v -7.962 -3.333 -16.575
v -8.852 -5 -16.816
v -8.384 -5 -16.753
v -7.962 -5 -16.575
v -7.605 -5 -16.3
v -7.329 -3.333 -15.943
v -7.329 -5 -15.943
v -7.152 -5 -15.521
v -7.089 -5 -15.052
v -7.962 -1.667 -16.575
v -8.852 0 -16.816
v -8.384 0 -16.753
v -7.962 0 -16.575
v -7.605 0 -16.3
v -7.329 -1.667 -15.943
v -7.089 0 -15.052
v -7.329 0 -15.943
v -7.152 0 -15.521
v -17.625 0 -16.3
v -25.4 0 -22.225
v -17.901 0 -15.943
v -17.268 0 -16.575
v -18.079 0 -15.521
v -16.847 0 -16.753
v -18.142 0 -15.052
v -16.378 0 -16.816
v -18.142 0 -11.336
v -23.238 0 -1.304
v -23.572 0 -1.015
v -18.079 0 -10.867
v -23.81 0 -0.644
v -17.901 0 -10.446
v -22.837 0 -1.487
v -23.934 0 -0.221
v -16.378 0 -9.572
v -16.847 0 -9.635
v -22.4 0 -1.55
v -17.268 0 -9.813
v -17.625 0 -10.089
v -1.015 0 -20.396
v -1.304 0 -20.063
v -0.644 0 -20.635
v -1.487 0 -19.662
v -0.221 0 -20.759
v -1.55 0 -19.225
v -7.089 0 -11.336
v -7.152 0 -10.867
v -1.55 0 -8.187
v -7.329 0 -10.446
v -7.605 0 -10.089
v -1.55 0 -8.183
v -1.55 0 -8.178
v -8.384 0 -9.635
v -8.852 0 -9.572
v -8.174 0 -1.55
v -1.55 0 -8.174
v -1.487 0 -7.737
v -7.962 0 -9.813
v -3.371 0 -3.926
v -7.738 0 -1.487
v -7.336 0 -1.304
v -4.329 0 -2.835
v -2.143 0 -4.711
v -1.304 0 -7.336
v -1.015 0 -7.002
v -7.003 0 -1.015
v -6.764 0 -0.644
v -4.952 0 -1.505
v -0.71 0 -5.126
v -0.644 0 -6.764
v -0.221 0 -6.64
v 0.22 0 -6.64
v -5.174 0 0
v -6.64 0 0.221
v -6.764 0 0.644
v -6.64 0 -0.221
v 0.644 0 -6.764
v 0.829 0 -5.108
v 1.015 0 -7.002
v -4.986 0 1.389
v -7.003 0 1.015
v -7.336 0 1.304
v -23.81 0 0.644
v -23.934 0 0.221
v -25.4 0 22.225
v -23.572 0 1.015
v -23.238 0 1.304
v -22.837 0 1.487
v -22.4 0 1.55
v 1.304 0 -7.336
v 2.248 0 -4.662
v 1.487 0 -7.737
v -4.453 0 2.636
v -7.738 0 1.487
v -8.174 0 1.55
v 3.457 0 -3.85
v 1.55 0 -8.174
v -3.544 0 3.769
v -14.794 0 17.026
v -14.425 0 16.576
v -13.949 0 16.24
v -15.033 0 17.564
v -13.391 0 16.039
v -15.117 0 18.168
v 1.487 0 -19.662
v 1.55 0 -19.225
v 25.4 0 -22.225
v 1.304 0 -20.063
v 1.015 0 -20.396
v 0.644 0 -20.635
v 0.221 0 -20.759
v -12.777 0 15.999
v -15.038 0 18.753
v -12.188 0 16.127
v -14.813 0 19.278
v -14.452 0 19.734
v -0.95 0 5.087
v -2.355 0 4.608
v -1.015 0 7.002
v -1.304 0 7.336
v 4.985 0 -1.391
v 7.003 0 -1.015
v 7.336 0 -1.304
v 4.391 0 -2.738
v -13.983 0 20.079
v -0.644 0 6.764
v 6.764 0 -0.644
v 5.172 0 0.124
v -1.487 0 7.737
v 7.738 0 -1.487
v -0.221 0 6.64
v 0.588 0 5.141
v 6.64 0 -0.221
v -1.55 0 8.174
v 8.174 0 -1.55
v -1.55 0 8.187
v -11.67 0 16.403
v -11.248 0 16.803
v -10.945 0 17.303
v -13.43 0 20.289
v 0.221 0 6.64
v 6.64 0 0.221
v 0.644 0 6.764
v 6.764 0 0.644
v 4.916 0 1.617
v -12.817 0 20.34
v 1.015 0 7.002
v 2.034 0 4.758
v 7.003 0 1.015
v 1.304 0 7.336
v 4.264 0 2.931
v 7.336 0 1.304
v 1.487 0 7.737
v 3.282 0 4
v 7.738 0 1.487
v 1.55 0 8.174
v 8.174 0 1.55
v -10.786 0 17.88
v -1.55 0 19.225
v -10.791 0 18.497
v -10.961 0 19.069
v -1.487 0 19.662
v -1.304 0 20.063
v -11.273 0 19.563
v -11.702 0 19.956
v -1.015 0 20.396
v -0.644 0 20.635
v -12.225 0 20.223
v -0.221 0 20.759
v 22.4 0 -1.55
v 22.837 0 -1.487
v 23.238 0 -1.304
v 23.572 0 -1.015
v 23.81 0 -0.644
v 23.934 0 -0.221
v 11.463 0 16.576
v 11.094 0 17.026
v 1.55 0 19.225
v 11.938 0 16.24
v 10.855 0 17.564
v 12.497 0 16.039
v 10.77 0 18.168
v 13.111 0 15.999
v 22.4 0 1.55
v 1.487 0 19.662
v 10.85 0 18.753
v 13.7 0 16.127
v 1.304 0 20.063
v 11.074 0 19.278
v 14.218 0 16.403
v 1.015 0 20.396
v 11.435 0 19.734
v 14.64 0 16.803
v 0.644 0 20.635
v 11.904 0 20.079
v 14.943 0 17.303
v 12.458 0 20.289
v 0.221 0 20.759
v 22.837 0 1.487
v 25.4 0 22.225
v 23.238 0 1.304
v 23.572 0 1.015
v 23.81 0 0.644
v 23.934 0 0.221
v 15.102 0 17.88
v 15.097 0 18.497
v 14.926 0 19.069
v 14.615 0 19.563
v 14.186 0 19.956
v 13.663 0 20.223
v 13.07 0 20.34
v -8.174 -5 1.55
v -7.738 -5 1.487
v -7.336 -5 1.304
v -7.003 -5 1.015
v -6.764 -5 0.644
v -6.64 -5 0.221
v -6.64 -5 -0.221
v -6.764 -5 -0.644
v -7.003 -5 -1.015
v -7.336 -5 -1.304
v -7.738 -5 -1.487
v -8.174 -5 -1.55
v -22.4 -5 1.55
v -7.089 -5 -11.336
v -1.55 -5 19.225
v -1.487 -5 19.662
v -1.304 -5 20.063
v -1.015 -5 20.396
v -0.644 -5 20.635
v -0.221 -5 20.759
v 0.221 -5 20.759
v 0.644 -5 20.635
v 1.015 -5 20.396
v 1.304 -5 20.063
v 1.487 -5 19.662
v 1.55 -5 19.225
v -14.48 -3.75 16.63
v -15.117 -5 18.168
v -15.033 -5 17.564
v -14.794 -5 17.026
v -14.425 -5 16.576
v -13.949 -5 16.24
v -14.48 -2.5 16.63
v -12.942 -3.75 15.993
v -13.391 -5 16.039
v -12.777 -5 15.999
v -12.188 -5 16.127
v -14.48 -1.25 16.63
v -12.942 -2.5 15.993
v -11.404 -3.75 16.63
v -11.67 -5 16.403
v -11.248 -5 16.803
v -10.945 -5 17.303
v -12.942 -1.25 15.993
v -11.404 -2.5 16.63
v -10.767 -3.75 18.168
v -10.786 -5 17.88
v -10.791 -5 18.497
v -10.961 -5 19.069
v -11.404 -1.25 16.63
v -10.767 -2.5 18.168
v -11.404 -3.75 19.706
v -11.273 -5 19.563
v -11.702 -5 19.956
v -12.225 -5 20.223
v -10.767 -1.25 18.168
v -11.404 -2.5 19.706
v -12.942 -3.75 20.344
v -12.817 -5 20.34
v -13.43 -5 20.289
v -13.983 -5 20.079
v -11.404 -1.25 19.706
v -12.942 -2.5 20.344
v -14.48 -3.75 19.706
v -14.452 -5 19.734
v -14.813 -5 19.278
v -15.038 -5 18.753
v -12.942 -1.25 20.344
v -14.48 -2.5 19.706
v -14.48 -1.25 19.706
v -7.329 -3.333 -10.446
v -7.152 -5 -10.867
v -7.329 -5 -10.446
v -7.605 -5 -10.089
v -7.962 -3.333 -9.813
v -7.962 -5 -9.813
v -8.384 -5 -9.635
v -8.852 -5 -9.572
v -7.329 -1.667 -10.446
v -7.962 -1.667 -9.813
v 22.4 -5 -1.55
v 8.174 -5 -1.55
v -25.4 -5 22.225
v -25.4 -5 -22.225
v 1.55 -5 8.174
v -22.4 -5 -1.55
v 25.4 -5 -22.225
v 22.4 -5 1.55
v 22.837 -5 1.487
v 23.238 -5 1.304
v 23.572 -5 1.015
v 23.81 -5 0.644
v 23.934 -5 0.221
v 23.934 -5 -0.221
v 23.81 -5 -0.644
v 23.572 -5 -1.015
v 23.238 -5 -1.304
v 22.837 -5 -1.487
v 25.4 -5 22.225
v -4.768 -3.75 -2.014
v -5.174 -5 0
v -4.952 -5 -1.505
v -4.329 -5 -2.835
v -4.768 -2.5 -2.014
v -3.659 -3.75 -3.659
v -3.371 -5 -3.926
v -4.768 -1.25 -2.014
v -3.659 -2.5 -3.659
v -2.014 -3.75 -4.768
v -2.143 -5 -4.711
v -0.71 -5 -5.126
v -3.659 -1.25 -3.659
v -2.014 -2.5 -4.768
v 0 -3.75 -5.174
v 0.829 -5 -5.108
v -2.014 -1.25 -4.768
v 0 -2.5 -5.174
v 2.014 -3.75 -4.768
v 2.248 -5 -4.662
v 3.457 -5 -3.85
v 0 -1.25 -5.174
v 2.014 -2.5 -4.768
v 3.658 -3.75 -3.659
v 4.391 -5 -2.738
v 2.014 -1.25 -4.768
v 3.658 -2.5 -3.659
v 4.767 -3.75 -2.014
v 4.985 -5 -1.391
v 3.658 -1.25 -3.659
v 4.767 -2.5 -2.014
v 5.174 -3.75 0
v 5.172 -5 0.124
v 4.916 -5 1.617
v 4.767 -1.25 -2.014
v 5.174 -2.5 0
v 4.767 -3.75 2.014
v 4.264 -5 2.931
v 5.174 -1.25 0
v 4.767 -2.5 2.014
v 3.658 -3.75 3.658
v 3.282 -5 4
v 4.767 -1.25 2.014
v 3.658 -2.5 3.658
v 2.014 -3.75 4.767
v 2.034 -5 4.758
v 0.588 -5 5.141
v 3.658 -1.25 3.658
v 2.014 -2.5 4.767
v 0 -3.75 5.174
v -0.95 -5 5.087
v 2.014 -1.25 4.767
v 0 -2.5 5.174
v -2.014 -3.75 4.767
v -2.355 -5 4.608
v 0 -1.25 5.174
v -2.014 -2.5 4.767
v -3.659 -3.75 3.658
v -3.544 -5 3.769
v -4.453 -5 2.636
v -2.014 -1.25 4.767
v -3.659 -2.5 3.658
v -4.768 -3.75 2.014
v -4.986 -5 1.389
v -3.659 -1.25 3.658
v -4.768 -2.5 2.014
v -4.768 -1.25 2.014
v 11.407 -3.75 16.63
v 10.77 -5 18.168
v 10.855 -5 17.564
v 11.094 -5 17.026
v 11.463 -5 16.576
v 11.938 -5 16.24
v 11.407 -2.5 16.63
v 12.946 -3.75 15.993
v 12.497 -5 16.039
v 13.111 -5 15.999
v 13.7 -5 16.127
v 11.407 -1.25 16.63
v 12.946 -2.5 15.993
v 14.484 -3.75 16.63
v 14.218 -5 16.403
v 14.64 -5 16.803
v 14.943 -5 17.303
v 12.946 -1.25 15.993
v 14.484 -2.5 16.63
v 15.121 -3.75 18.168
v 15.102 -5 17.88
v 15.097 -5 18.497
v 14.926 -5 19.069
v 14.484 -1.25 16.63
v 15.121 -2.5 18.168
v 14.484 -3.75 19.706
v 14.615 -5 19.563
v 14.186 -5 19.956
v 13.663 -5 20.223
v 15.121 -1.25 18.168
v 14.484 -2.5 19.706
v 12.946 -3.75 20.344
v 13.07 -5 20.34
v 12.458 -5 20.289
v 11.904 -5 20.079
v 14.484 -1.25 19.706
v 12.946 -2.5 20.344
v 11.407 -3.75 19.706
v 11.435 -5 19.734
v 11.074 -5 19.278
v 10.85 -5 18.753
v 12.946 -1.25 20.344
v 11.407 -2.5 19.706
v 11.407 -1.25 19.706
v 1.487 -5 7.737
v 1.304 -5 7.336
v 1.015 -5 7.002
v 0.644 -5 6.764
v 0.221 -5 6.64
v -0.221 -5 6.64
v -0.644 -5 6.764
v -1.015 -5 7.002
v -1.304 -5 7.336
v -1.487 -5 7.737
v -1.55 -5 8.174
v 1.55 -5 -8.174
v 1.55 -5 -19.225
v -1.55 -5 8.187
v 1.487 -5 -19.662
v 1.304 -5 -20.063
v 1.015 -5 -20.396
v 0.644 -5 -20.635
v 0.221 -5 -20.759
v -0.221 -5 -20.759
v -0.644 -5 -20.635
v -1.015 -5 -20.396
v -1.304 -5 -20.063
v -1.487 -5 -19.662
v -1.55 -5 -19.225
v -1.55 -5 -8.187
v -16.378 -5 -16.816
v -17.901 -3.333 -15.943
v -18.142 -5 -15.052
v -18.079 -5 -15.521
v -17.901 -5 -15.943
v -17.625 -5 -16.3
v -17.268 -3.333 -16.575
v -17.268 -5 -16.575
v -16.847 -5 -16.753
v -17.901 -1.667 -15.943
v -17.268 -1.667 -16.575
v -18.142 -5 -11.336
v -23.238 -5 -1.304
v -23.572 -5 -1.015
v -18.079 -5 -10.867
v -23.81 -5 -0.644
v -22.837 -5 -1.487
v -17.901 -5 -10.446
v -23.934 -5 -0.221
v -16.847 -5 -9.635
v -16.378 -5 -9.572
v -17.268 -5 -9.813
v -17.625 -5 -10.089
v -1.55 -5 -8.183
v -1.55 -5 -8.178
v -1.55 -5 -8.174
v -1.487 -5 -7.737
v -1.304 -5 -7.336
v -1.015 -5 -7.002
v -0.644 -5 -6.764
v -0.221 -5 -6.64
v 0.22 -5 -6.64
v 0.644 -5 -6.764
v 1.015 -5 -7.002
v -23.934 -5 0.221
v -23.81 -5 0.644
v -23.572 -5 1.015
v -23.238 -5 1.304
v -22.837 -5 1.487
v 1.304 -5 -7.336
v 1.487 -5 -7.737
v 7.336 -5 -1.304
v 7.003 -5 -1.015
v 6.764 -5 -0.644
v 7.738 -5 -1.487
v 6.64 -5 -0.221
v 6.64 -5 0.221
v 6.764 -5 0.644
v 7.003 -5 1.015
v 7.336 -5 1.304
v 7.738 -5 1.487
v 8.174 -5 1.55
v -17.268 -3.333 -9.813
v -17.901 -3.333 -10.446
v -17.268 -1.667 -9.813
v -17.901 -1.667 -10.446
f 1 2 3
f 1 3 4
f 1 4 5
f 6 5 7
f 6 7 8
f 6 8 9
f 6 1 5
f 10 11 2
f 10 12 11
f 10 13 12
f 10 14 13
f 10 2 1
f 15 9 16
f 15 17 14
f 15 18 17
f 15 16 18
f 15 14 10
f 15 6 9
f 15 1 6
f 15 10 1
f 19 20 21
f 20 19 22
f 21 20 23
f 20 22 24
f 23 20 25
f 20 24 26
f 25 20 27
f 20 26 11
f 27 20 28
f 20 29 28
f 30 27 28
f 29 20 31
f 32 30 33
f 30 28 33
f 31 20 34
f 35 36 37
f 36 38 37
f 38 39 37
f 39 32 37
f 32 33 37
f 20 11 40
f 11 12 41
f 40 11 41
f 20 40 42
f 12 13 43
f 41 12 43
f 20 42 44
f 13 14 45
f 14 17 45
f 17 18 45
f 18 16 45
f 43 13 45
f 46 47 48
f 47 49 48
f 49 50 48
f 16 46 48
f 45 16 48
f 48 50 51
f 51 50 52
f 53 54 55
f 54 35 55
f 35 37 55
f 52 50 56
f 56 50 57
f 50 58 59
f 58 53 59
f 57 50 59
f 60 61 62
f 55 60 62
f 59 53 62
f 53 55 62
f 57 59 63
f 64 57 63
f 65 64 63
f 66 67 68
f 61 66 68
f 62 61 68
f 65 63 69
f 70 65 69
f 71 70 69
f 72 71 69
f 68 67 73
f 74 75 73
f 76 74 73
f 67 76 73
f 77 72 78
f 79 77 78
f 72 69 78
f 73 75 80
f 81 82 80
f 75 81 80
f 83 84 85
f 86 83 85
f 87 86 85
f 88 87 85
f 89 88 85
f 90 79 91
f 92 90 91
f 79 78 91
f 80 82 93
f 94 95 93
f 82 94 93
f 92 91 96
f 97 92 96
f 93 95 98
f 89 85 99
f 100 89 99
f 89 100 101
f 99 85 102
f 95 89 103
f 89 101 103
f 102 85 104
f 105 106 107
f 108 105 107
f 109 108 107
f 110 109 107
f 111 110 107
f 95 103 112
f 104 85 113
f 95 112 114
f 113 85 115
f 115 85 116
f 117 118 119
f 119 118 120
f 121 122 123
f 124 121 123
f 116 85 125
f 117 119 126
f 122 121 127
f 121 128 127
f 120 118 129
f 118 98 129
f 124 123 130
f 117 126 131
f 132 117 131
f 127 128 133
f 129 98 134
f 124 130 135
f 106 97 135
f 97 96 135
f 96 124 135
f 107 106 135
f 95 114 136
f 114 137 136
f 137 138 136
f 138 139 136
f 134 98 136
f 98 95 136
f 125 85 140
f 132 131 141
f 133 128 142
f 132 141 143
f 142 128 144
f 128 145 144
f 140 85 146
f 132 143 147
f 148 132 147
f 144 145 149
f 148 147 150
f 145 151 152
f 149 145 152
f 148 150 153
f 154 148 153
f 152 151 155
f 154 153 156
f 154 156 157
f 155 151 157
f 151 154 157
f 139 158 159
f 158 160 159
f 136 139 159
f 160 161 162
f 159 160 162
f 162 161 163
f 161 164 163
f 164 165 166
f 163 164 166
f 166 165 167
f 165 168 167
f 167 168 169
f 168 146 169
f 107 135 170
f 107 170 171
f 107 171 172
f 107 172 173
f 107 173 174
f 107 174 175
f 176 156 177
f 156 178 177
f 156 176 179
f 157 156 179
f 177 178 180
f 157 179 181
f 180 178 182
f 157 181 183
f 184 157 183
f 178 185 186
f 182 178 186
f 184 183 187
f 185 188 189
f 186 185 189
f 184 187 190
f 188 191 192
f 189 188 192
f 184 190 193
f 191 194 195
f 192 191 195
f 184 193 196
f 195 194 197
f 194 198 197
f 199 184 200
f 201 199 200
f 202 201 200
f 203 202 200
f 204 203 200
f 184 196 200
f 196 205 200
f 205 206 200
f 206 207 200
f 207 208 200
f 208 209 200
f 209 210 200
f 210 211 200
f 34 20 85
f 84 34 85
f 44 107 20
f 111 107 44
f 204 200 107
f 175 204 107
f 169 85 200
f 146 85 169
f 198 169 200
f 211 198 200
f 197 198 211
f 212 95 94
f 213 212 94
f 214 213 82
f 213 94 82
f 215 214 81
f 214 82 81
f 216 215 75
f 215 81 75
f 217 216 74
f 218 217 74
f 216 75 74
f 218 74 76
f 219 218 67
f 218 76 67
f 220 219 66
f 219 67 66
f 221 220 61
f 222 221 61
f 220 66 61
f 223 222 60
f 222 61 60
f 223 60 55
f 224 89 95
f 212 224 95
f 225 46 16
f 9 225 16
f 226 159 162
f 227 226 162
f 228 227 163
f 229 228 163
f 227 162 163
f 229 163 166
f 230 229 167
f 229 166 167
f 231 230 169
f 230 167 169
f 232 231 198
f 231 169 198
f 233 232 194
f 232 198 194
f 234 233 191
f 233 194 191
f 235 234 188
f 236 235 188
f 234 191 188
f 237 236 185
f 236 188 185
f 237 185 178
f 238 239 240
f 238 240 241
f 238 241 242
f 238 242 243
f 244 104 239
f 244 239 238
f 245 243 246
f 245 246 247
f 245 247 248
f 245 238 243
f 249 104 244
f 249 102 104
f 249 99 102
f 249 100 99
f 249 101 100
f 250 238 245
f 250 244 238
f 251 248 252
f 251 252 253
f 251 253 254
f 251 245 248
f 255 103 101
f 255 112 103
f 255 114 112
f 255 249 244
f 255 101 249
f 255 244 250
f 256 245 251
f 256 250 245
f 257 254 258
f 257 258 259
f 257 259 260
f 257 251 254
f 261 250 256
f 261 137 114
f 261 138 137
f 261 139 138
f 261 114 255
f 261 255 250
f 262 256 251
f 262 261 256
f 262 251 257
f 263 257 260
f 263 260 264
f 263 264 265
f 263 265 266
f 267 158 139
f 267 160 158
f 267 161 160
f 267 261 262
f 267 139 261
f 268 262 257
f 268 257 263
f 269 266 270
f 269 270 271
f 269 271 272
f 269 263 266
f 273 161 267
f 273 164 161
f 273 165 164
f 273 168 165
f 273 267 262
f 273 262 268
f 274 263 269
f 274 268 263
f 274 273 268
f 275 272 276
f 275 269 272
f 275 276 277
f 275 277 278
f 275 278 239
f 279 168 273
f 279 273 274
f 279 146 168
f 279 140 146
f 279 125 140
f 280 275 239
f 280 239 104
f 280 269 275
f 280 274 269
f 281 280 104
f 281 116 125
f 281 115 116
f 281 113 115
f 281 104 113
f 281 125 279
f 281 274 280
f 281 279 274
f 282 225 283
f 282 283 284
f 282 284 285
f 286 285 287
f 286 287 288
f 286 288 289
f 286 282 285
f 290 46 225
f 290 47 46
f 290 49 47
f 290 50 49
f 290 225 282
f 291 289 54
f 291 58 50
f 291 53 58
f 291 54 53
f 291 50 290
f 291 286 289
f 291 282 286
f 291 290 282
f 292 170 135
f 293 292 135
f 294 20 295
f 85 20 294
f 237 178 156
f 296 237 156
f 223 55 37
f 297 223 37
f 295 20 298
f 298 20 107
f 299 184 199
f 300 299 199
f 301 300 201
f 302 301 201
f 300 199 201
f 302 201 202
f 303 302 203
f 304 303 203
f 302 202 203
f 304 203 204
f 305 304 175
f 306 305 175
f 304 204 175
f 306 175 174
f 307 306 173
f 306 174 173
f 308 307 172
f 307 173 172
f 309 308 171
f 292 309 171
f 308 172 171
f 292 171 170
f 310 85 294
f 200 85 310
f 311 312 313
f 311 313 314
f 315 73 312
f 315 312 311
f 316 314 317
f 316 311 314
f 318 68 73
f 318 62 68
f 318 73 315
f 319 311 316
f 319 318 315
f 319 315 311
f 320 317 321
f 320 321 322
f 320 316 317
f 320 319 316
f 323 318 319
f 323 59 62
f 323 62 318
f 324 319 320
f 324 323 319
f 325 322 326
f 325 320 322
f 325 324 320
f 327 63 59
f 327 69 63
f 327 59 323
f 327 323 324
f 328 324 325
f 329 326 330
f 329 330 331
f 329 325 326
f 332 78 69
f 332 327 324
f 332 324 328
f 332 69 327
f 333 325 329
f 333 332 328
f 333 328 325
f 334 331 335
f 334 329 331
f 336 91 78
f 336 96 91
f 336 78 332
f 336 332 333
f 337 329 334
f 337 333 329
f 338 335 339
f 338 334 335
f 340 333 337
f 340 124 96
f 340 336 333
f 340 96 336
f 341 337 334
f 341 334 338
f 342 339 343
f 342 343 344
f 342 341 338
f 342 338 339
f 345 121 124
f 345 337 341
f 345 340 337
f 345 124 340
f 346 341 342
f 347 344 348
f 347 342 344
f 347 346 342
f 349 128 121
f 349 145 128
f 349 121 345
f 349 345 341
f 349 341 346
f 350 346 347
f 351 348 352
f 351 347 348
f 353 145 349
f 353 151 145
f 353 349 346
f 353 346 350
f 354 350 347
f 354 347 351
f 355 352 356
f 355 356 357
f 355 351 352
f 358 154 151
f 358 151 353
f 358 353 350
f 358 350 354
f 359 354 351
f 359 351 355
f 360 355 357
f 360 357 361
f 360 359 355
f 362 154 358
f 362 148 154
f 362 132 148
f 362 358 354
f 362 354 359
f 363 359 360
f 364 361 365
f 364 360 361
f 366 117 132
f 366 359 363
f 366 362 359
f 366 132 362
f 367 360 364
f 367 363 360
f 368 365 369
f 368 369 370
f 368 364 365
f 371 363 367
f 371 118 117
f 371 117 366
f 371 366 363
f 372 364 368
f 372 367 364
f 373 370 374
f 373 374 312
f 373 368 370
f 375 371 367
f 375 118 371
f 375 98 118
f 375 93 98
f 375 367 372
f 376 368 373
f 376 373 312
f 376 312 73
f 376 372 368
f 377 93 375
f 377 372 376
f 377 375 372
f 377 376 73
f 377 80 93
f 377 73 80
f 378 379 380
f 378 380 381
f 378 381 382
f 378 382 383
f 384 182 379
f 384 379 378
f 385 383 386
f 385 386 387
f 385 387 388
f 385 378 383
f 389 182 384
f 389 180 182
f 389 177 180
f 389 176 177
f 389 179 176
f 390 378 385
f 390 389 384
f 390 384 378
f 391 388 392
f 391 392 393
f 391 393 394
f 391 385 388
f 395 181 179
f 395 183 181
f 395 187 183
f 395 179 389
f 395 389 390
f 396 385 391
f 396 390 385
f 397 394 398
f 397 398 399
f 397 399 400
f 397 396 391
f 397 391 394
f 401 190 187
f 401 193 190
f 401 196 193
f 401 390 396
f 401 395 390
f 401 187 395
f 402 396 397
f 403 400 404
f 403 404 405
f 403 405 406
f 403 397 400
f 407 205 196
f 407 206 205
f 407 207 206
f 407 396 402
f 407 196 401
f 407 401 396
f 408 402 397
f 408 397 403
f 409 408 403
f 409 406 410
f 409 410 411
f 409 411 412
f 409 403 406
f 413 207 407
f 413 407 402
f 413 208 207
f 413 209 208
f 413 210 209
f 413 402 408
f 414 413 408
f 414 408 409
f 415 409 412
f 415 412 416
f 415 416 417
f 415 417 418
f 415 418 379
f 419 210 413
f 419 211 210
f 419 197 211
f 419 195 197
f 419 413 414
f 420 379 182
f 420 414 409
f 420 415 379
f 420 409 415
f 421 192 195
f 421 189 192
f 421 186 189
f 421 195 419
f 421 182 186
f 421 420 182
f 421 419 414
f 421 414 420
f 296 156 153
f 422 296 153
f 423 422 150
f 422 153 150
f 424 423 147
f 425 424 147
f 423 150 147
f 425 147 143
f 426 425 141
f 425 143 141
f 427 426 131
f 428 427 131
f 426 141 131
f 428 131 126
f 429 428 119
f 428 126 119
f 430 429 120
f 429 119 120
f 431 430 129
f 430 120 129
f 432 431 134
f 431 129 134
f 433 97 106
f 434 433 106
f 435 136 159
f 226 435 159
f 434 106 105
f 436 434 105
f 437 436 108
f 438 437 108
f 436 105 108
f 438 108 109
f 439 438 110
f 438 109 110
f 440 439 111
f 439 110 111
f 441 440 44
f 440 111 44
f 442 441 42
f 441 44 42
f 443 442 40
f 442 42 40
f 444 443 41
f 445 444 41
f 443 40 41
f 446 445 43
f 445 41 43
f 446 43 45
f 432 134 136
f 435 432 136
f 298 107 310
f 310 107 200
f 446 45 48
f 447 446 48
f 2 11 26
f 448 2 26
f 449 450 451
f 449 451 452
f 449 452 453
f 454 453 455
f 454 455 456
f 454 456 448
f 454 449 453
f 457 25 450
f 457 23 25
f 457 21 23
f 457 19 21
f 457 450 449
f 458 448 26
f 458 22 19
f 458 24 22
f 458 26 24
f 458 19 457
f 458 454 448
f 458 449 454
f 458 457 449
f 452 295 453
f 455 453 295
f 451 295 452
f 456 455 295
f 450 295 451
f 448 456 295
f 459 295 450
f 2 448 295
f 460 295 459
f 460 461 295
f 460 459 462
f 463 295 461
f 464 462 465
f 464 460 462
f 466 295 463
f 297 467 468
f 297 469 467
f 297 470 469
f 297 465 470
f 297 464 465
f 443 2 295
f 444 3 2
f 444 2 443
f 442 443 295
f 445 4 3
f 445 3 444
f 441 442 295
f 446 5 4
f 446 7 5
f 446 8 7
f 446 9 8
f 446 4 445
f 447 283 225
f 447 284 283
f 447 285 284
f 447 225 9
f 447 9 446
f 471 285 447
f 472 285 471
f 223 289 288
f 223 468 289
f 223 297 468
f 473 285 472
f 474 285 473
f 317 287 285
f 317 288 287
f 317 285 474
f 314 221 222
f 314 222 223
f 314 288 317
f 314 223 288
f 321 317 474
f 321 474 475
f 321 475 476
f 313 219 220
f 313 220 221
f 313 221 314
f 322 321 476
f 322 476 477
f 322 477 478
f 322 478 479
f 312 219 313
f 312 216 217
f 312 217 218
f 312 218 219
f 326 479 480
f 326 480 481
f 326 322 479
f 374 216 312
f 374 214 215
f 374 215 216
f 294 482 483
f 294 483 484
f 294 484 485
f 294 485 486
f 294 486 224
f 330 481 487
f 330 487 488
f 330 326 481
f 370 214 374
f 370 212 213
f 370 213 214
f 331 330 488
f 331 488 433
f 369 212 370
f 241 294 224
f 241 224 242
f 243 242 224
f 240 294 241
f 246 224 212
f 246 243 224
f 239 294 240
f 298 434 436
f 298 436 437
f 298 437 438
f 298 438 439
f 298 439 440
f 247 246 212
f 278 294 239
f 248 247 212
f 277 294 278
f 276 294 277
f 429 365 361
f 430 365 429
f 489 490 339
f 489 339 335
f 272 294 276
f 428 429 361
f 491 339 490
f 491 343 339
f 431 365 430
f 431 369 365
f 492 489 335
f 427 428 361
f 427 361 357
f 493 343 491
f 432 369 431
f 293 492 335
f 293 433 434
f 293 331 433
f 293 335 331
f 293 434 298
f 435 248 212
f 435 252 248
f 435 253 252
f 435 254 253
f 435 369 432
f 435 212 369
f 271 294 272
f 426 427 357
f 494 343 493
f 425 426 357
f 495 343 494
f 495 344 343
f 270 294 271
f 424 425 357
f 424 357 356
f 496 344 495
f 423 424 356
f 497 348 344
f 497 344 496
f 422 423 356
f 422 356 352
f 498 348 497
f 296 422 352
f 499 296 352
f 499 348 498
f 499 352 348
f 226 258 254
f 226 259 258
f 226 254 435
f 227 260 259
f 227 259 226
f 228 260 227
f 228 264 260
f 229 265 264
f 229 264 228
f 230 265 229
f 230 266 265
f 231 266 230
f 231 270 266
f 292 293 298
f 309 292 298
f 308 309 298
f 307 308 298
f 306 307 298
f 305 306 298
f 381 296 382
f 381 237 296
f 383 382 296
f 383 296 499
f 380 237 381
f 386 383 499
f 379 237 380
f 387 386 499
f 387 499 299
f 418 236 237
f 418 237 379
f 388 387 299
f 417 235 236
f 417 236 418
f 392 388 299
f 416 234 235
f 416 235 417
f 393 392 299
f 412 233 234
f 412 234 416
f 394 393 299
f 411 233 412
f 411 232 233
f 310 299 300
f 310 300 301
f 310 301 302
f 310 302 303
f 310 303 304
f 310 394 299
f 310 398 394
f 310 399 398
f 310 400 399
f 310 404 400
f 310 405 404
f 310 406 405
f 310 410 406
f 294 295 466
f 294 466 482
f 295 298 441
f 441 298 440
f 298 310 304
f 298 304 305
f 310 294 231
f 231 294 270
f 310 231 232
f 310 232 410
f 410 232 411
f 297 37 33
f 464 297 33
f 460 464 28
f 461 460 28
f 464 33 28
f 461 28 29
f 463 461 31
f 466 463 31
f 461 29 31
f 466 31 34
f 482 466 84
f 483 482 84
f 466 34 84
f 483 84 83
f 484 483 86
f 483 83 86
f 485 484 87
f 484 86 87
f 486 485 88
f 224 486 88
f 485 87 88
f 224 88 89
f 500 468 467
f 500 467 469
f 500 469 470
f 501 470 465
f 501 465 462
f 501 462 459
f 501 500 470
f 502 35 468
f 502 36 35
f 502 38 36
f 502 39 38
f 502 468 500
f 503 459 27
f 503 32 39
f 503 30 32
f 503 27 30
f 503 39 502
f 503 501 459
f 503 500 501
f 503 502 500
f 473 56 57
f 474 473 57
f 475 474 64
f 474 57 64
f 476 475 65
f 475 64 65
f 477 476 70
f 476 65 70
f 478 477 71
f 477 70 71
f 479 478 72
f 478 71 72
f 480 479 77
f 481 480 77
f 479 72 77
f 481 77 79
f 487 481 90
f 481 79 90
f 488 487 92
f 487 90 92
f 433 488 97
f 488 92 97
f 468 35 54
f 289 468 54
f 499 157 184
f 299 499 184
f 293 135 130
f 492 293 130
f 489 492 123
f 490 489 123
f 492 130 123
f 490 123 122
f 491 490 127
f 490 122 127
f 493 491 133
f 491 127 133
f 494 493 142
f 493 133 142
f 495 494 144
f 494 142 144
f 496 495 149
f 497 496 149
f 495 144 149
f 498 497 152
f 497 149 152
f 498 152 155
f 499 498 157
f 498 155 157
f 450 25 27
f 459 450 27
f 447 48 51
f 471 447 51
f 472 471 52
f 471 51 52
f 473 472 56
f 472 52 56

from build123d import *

# Parameters (mm, degrees)
F0_W     = 50.800353
F0_H     = 44.45
F1_DEPTH = 5


# Not quite as in the source:
# - ends of sketch curves that miss each other by under 0.0002 mm in the source are joined


with BuildPart() as f1:
    # F0 (on Front) → F1 (new body)
    with BuildSketch(Plane.XZ):
        with Locations((5e-07, 0)):
            Rectangle(F0_W, F0_H)
        with BuildLine():
            add(Edge.make_bspline(
                [(-7.08854, -11.336161), (-7.08854, -10.361789), (-7.878409, -9.572272), (-8.852429, -9.572272)],
                knots=[0, 0, 0, 0, 1, 1, 1, 1], degree=3))
            Line((-7.08854, -11.336161), (-7.08854, -15.052322))
            add(Edge.make_bspline(
                [(-8.852429, -16.816211), (-7.878409, -16.816211), (-7.08854, -16.026695), (-7.08854, -15.052322)],
                knots=[0, 0, 0, 0, 1, 1, 1, 1], degree=3))
            Line((-8.852429, -16.816211), (-16.378237, -16.816211))
            add(Edge.make_bspline(
                [(-18.142126, -15.052322), (-18.142126, -16.026695), (-17.352257, -16.816211), (-16.378237, -16.816211)],
                knots=[0, 0, 0, 0, 1, 1, 1, 1], degree=3))
            Line((-18.142126, -15.052322), (-18.142126, -11.336161))
            add(Edge.make_bspline(
                [(-16.378237, -9.572272), (-17.352257, -9.572272), (-18.142126, -10.361789), (-18.142126, -11.336161)],
                knots=[0, 0, 0, 0, 1, 1, 1, 1], degree=3))
            Line((-16.378237, -9.572272), (-8.852429, -9.572272))
        make_face(mode=Mode.SUBTRACT)
        with BuildLine():
            Line((-1.5500305536, -19.2250000002), (-1.5500305536, -8.1871465892))
            ThreePointArc((-1.5500305536, -8.1871465892), (-1.5500734508, -8.1804888446), (-1.55008775, -8.1738309772))
            ThreePointArc((-1.55008775, -8.1738309772), (-9.17611e-05, -6.6238309772), (1.54991225, -8.173822955))
            Line((1.54991225, -8.173822955), (1.5499694464, -19.224991978))
            ThreePointArc((1.5499694464, -19.224991978), (-2.65425e-05, -20.7749959891), (-1.5500305536, -19.2250000002))
        make_face(mode=Mode.SUBTRACT)
        with BuildLine():
            add(Edge.make_bspline(
                [(-0.0001188036, 5.1738309774), (-2.8576188036, 5.1738309774), (-5.1743108036, 2.8571389774), (-5.1743108036, -8.0226e-06)],
                knots=[0, 0, 0, 0, 1, 1, 1, 1], degree=3))
            add(Edge.make_bspline(
                [(5.1737201964, -8.0226e-06), (5.1737201964, 2.8571389774), (2.8573811964, 5.1738309774), (-0.0001188036, 5.1738309774)],
                knots=[0, 0, 0, 0, 1, 1, 1, 1], degree=3))
            add(Edge.make_bspline(
                [(-0.0001188036, -5.1742000226), (2.8573811964, -5.1742000226), (5.1737201964, -2.8578610226), (5.1737201964, -8.0226e-06)],
                knots=[0, 0, 0, 0, 1, 1, 1, 1], degree=3))
            add(Edge.make_bspline(
                [(-5.1743108036, -8.0226e-06), (-5.1743108036, -2.8578610226), (-2.8576188036, -5.1742000226), (-0.0001188036, -5.1742000226)],
                knots=[0, 0, 0, 0, 1, 1, 1, 1], degree=3))
        make_face(mode=Mode.SUBTRACT)
        with BuildLine():
            Line((-22.400176, 1.55), (-8.1743108036, 1.55))
            ThreePointArc((-8.1743108036, 1.55), (-6.624368, 0), (-8.174368, -1.55))
            Line((-8.174368, -1.55), (-22.400176, -1.55))
            ThreePointArc((-22.400176, -1.55), (-23.950176, 0), (-22.400176, 1.55))
        make_face(mode=Mode.SUBTRACT)
        with BuildLine():
            add(Edge.make_bspline(
                [(-12.941829, 20.343636), (-14.143743, 20.343636), (-15.117409, 19.369616), (-15.117409, 18.168055)],
                knots=[0, 0, 0, 0, 1, 1, 1, 1], degree=3))
            add(Edge.make_bspline(
                [(-10.766601, 18.168055), (-10.766601, 19.369616), (-11.740621, 20.343636), (-12.941829, 20.343636)],
                knots=[0, 0, 0, 0, 1, 1, 1, 1], degree=3))
            add(Edge.make_bspline(
                [(-12.941829, 15.992828), (-11.740621, 15.992828), (-10.766601, 16.966847), (-10.766601, 18.168055)],
                knots=[0, 0, 0, 0, 1, 1, 1, 1], degree=3))
            add(Edge.make_bspline(
                [(-15.117409, 18.168055), (-15.117409, 16.966847), (-14.143743, 15.992828), (-12.941829, 15.992828)],
                knots=[0, 0, 0, 0, 1, 1, 1, 1], degree=3))
        make_face(mode=Mode.SUBTRACT)
        with BuildLine():
            Line((-1.5500305536, 8.1871465892), (-1.5500305536, 19.2250000002))
            ThreePointArc((-1.5500305536, 19.2250000002), (-2.65425e-05, 20.7749959891), (1.5499694464, 19.224991978))
            Line((1.5499694464, 19.224991978), (1.54991225, 8.1738309772))
            ThreePointArc((1.54991225, 8.1738309772), (-9.17611e-05, 6.6238309772), (-1.55008775, 8.1738309772))
            Line((-1.55008775, 8.1738309772), (-1.5500305536, 8.1871465892))
        make_face(mode=Mode.SUBTRACT)
        with BuildLine():
            Line((8.1743108036, 1.55), (22.400176, 1.55))
            ThreePointArc((22.400176, 1.55), (23.950176, 0), (22.400176, -1.55))
            Line((22.400176, -1.55), (8.1743108036, -1.55))
            ThreePointArc((8.1743108036, -1.55), (6.624368, 0), (8.1743108036, 1.55))
        make_face(mode=Mode.SUBTRACT)
        with BuildLine():
            add(Edge.make_bspline(
                [(12.94571, 20.343636), (11.743796, 20.343636), (10.770129, 19.369616), (10.770129, 18.168055)],
                knots=[0, 0, 0, 0, 1, 1, 1, 1], degree=3))
            add(Edge.make_bspline(
                [(15.121291, 18.168055), (15.121291, 19.369616), (14.146918, 20.343636), (12.94571, 20.343636)],
                knots=[0, 0, 0, 0, 1, 1, 1, 1], degree=3))
            add(Edge.make_bspline(
                [(12.94571, 15.992828), (14.146918, 15.992828), (15.121291, 16.966847), (15.121291, 18.168055)],
                knots=[0, 0, 0, 0, 1, 1, 1, 1], degree=3))
            add(Edge.make_bspline(
                [(10.770129, 18.168055), (10.770129, 16.966847), (11.743796, 15.992828), (12.94571, 15.992828)],
                knots=[0, 0, 0, 0, 1, 1, 1, 1], degree=3))
        make_face(mode=Mode.SUBTRACT)
    extrude(amount=F1_DEPTH)


solid = f1.part
